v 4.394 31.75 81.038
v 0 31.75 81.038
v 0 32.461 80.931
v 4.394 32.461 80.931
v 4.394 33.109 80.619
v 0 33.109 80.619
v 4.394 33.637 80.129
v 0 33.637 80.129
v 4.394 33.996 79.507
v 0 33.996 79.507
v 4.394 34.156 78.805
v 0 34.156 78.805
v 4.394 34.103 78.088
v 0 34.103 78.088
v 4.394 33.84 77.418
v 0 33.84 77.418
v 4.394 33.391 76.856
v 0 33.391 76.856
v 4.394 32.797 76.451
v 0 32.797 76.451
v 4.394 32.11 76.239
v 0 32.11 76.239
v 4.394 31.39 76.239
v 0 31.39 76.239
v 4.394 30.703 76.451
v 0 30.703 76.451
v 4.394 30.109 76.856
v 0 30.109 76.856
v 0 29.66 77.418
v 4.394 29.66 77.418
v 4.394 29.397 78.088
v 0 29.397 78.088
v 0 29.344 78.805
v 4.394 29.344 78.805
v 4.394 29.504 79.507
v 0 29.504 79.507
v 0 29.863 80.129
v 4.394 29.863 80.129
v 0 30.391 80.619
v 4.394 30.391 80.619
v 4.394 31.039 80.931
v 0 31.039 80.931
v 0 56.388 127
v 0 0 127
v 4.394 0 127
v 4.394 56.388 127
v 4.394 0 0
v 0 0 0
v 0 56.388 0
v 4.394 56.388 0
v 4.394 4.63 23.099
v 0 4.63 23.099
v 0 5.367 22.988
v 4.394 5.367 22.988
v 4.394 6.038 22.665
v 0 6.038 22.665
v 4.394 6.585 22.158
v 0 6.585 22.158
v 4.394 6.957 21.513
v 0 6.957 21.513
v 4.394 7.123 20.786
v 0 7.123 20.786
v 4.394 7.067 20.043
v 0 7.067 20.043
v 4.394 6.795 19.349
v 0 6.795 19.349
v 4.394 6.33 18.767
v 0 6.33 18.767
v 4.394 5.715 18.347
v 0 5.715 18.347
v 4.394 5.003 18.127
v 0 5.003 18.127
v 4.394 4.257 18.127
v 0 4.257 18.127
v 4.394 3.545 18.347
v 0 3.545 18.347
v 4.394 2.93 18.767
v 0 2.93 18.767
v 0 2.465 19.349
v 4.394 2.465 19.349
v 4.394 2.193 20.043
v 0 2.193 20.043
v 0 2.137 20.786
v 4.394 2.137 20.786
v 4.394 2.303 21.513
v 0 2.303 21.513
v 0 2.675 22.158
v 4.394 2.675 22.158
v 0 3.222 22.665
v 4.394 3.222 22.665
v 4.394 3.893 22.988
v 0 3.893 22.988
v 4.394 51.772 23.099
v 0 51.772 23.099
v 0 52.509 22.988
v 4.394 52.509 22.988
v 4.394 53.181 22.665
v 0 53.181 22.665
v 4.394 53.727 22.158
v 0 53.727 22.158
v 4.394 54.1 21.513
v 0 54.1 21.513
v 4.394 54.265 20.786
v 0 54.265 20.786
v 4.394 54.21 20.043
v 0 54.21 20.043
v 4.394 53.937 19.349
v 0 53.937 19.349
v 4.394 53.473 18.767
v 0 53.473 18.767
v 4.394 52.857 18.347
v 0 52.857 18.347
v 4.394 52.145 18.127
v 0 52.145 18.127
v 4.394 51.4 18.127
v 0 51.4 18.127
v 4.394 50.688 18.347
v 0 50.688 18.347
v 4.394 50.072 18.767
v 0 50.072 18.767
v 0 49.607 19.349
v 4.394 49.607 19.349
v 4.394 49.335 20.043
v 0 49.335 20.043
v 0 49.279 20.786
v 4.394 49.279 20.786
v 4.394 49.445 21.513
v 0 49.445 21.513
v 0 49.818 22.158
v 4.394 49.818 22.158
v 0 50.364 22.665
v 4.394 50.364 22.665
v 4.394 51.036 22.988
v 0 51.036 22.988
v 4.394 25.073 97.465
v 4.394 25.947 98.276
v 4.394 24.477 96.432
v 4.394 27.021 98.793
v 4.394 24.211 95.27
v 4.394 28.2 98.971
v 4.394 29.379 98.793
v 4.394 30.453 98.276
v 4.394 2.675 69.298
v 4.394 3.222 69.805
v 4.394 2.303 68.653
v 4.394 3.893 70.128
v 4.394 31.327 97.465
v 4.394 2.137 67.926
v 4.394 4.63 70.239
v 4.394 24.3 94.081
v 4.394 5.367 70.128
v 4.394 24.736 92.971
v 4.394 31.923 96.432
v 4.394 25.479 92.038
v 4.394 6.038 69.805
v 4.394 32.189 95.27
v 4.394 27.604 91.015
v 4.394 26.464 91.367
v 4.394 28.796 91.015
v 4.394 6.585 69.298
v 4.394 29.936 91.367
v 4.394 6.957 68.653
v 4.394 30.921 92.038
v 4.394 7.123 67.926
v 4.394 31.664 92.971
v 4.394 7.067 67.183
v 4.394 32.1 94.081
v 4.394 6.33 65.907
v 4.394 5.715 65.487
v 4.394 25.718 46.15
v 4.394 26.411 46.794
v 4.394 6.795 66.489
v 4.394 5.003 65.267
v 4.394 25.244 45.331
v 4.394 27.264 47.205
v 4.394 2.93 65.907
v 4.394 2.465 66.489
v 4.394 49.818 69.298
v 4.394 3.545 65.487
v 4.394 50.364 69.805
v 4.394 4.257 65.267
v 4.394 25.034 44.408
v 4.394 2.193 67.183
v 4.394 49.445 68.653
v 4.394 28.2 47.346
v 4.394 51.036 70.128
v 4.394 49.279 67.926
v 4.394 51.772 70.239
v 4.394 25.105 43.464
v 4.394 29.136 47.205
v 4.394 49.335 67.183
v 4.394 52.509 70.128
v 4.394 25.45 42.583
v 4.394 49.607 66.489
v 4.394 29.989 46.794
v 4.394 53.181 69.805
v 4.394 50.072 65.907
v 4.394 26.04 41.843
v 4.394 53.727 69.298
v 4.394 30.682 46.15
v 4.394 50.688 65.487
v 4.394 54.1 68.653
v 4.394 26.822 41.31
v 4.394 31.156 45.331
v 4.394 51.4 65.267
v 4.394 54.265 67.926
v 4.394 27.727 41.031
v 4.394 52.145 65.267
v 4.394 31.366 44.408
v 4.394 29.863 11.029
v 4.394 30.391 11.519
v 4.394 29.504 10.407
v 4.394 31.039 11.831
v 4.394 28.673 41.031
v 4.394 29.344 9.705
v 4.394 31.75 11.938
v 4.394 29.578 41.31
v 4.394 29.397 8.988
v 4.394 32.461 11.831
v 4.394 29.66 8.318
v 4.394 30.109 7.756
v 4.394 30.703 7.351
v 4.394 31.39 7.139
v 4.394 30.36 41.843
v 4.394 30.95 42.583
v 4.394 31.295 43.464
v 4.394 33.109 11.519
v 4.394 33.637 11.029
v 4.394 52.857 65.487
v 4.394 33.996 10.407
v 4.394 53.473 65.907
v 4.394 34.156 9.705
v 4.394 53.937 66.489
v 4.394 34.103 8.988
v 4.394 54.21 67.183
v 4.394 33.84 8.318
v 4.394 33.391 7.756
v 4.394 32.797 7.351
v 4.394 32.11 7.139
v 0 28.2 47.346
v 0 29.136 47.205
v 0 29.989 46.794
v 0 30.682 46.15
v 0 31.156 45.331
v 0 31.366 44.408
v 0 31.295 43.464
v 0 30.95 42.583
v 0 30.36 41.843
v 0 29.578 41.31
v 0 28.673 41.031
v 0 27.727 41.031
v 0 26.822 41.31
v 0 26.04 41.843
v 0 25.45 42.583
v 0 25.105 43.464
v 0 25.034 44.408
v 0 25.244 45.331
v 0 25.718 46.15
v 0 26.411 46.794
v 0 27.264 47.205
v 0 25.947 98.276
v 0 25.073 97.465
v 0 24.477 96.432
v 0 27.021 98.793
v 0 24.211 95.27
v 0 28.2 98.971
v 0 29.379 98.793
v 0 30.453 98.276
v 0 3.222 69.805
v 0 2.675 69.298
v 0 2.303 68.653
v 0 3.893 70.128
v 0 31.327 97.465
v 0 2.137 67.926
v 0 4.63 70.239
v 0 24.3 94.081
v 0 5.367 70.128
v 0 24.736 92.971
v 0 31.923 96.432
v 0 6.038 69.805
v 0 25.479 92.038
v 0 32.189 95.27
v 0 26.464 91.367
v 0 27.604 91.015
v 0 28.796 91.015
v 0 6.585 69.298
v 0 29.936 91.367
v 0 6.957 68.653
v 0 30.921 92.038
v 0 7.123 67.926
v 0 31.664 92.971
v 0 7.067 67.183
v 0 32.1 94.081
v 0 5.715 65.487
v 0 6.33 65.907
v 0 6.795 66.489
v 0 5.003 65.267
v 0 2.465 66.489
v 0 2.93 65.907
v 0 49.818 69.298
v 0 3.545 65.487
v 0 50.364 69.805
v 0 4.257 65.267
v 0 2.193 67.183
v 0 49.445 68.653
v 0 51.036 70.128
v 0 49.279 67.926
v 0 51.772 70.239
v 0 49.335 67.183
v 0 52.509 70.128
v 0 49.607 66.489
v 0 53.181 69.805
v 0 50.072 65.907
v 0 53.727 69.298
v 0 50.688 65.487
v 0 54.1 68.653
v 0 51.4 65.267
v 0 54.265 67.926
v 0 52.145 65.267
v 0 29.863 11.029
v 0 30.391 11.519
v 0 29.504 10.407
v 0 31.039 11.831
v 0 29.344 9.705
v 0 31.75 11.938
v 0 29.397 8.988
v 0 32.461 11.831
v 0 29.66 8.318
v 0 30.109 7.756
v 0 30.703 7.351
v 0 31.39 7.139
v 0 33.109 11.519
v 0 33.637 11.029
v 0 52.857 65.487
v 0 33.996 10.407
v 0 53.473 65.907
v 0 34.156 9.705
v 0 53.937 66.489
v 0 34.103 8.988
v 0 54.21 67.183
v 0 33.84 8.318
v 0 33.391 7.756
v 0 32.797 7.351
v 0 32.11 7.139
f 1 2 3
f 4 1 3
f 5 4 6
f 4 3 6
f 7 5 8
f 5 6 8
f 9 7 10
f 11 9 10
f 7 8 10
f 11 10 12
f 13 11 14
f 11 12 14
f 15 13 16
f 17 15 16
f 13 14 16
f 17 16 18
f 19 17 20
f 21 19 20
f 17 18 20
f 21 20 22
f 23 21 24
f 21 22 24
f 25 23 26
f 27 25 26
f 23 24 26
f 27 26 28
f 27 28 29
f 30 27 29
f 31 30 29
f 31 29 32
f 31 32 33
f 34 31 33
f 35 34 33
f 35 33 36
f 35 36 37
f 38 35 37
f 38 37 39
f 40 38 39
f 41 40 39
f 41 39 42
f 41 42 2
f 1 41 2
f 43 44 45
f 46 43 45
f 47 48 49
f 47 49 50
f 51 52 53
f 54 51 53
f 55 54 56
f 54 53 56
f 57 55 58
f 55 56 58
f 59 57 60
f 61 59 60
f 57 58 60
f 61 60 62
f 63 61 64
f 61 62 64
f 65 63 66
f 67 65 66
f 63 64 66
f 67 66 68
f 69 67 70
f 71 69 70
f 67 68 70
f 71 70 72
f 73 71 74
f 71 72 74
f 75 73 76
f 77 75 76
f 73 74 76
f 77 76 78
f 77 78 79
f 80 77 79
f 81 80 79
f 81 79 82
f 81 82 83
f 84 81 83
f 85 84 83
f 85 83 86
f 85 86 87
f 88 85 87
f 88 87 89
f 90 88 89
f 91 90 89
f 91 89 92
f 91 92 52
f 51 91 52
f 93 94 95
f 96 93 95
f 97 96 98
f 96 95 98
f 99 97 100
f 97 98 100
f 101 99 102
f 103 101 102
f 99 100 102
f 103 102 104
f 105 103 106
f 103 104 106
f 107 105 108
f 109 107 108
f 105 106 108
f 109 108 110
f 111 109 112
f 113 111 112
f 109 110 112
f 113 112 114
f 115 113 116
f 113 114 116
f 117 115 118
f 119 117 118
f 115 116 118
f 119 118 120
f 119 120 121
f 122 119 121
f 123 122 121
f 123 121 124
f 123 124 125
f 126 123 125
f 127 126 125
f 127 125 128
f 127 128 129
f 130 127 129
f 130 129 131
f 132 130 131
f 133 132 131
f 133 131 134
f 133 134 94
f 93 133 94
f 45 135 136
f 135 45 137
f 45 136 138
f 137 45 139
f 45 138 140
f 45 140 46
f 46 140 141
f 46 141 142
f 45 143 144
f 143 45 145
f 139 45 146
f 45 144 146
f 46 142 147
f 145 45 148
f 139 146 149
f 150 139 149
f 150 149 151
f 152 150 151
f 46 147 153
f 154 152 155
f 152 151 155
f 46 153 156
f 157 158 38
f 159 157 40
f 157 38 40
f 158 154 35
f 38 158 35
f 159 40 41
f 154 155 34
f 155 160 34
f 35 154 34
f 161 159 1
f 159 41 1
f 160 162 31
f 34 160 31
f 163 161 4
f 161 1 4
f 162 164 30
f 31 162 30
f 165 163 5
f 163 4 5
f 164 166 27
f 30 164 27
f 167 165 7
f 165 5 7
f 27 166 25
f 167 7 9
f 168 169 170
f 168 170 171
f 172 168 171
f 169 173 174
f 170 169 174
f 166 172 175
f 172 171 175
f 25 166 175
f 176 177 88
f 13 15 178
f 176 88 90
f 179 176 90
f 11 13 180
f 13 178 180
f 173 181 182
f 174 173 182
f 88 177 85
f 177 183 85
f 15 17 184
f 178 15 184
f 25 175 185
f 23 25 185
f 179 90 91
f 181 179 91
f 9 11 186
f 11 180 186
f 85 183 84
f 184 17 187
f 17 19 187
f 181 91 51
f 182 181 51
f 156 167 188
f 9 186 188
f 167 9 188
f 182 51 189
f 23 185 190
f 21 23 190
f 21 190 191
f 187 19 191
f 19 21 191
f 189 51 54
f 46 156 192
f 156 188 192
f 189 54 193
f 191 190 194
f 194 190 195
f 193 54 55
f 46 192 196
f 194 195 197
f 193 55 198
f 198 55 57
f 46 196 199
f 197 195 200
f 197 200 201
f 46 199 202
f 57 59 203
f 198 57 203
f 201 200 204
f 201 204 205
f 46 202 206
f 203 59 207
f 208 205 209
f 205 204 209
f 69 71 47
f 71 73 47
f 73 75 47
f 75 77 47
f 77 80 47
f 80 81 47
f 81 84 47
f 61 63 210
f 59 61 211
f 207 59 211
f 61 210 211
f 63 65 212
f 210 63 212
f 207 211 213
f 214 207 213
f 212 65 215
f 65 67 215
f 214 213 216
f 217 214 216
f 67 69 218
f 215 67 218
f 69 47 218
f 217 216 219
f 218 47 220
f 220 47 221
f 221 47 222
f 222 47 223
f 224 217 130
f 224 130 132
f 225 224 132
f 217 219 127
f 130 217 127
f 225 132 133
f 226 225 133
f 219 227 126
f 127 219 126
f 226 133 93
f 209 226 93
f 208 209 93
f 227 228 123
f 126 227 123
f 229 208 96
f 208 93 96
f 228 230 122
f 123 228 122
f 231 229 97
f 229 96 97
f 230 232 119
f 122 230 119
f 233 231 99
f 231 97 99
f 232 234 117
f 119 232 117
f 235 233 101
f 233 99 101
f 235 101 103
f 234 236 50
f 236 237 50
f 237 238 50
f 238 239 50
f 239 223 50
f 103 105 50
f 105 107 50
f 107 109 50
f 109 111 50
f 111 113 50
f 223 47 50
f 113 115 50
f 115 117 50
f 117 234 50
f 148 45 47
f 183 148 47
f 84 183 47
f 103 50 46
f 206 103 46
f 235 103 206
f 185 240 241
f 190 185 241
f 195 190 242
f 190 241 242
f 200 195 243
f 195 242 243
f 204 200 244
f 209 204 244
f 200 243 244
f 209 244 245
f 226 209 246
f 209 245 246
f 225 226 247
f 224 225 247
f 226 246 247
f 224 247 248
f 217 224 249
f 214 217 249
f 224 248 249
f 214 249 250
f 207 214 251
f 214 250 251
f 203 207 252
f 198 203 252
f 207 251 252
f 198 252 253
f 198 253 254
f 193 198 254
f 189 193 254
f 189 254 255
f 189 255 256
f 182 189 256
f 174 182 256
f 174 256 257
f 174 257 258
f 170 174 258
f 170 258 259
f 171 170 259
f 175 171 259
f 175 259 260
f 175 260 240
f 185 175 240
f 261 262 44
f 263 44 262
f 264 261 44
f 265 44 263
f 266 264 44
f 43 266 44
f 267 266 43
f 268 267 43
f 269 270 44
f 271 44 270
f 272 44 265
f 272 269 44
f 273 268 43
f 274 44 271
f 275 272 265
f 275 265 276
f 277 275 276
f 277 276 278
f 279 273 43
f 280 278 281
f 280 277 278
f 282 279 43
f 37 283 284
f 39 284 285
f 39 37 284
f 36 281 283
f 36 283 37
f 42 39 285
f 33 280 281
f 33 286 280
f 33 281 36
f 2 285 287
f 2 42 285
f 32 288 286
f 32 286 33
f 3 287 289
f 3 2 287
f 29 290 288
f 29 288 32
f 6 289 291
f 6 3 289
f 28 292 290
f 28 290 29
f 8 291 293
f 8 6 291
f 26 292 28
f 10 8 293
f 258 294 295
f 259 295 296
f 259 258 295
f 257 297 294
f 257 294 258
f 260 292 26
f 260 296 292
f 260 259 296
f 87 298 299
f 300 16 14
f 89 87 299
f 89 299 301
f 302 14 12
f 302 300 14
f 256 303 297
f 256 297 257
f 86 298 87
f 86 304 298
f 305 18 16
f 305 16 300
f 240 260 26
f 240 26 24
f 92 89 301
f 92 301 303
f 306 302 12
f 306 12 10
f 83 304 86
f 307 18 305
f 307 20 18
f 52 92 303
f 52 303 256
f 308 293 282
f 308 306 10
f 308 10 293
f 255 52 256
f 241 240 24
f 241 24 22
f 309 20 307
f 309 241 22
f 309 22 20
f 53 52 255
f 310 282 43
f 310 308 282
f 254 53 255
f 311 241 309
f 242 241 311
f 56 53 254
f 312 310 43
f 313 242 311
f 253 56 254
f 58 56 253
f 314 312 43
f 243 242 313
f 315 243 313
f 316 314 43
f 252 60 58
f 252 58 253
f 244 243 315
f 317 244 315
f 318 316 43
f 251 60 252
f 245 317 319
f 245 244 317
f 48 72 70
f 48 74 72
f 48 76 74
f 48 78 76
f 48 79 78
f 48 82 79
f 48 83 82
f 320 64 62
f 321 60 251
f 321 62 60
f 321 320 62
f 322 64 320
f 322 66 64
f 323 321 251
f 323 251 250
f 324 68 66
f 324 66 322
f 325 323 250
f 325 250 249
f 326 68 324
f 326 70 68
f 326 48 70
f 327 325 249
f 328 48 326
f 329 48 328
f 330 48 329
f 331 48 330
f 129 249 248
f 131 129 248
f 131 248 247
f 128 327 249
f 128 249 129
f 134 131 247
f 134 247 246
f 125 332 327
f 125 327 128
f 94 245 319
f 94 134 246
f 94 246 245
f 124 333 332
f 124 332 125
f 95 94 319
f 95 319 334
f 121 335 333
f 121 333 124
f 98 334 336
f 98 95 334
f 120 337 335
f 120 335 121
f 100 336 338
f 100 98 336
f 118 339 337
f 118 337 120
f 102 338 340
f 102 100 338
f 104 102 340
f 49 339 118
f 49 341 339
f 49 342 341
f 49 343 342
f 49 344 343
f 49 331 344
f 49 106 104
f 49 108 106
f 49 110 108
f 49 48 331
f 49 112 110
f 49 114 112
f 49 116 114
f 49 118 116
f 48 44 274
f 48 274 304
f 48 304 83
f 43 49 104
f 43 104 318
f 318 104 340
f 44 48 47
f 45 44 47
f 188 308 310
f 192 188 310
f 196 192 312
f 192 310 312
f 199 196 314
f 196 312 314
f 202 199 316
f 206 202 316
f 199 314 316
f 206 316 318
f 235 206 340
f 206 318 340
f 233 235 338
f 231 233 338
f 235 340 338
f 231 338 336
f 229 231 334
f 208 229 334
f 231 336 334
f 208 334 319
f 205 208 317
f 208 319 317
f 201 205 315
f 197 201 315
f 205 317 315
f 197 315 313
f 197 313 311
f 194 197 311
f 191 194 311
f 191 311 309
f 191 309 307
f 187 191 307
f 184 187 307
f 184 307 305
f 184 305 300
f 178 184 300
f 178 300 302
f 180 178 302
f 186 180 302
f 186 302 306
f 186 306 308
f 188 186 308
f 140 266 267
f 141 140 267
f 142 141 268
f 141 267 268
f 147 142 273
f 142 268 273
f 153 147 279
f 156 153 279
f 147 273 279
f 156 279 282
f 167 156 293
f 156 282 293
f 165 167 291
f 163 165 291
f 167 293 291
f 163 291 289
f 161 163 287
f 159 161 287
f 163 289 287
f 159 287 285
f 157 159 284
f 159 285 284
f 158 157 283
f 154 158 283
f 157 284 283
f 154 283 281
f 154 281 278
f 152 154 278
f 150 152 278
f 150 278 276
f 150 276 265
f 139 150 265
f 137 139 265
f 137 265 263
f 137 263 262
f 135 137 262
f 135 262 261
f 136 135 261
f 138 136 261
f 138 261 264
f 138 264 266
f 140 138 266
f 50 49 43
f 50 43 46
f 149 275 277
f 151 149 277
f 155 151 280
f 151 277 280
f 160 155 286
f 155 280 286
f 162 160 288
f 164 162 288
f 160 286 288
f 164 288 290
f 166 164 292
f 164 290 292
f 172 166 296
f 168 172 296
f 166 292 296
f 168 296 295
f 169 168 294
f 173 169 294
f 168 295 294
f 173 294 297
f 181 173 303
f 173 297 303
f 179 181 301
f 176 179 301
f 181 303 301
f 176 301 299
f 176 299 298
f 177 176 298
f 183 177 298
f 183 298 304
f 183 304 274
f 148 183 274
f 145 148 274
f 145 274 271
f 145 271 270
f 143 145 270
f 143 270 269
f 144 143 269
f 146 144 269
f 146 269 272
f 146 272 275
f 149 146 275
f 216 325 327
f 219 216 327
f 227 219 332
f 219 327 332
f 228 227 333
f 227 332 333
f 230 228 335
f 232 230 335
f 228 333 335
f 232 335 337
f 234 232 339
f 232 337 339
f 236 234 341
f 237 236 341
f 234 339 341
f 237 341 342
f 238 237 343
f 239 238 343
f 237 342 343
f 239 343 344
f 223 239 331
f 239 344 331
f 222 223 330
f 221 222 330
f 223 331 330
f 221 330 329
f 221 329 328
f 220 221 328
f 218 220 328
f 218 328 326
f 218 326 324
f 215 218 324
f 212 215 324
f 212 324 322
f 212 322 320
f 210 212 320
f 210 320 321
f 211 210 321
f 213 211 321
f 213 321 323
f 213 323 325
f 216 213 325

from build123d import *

# Parameters (mm, degrees)
SKETCH2_W           = 4.3942
SKETCH2_H           = 56.388
BOSS_EXTRUDE1_DEPTH = 127
SKETCH4_R           = 2.5
SKETCH4_R_2         = 2.413
SKETCH4_R_3         = 3.175
SKETCH4_R_4         = 4
CUT_EXTRUDE2_DEPTH  = 140.024873809


with BuildPart() as part:
    # Sketch2 → Boss-Extrude1 (new body)
    with BuildSketch(Plane.XY):
        with Locations((2.1971, 28.194)):
            Rectangle(SKETCH2_W, SKETCH2_H)
    extrude(amount=BOSS_EXTRUDE1_DEPTH)

    # Sketch4 → Cut-Extrude2 (cut, through all)
    with BuildSketch(Plane.ZY):
        with Locations((20.5994, 4.629999884)):
            Circle(SKETCH4_R)
        with Locations((9.525, 31.75)):
            Circle(SKETCH4_R_2)
        with Locations((67.7394, 4.629999884)):
            Circle(SKETCH4_R)
        with Locations((78.625, 31.75)):
            Circle(SKETCH4_R_2)
        with Locations((44.1706, 28.199999884)):
            Circle(SKETCH4_R_3)
        with Locations((94.9706, 28.199999884)):
            Circle(SKETCH4_R_4)
        with Locations((67.7394, 51.772399884)):
            Circle(SKETCH4_R)
        with Locations((20.5994, 51.772399884)):
            Circle(SKETCH4_R)
    extrude(amount=-CUT_EXTRUDE2_DEPTH, mode=Mode.SUBTRACT)


solid = part.part
